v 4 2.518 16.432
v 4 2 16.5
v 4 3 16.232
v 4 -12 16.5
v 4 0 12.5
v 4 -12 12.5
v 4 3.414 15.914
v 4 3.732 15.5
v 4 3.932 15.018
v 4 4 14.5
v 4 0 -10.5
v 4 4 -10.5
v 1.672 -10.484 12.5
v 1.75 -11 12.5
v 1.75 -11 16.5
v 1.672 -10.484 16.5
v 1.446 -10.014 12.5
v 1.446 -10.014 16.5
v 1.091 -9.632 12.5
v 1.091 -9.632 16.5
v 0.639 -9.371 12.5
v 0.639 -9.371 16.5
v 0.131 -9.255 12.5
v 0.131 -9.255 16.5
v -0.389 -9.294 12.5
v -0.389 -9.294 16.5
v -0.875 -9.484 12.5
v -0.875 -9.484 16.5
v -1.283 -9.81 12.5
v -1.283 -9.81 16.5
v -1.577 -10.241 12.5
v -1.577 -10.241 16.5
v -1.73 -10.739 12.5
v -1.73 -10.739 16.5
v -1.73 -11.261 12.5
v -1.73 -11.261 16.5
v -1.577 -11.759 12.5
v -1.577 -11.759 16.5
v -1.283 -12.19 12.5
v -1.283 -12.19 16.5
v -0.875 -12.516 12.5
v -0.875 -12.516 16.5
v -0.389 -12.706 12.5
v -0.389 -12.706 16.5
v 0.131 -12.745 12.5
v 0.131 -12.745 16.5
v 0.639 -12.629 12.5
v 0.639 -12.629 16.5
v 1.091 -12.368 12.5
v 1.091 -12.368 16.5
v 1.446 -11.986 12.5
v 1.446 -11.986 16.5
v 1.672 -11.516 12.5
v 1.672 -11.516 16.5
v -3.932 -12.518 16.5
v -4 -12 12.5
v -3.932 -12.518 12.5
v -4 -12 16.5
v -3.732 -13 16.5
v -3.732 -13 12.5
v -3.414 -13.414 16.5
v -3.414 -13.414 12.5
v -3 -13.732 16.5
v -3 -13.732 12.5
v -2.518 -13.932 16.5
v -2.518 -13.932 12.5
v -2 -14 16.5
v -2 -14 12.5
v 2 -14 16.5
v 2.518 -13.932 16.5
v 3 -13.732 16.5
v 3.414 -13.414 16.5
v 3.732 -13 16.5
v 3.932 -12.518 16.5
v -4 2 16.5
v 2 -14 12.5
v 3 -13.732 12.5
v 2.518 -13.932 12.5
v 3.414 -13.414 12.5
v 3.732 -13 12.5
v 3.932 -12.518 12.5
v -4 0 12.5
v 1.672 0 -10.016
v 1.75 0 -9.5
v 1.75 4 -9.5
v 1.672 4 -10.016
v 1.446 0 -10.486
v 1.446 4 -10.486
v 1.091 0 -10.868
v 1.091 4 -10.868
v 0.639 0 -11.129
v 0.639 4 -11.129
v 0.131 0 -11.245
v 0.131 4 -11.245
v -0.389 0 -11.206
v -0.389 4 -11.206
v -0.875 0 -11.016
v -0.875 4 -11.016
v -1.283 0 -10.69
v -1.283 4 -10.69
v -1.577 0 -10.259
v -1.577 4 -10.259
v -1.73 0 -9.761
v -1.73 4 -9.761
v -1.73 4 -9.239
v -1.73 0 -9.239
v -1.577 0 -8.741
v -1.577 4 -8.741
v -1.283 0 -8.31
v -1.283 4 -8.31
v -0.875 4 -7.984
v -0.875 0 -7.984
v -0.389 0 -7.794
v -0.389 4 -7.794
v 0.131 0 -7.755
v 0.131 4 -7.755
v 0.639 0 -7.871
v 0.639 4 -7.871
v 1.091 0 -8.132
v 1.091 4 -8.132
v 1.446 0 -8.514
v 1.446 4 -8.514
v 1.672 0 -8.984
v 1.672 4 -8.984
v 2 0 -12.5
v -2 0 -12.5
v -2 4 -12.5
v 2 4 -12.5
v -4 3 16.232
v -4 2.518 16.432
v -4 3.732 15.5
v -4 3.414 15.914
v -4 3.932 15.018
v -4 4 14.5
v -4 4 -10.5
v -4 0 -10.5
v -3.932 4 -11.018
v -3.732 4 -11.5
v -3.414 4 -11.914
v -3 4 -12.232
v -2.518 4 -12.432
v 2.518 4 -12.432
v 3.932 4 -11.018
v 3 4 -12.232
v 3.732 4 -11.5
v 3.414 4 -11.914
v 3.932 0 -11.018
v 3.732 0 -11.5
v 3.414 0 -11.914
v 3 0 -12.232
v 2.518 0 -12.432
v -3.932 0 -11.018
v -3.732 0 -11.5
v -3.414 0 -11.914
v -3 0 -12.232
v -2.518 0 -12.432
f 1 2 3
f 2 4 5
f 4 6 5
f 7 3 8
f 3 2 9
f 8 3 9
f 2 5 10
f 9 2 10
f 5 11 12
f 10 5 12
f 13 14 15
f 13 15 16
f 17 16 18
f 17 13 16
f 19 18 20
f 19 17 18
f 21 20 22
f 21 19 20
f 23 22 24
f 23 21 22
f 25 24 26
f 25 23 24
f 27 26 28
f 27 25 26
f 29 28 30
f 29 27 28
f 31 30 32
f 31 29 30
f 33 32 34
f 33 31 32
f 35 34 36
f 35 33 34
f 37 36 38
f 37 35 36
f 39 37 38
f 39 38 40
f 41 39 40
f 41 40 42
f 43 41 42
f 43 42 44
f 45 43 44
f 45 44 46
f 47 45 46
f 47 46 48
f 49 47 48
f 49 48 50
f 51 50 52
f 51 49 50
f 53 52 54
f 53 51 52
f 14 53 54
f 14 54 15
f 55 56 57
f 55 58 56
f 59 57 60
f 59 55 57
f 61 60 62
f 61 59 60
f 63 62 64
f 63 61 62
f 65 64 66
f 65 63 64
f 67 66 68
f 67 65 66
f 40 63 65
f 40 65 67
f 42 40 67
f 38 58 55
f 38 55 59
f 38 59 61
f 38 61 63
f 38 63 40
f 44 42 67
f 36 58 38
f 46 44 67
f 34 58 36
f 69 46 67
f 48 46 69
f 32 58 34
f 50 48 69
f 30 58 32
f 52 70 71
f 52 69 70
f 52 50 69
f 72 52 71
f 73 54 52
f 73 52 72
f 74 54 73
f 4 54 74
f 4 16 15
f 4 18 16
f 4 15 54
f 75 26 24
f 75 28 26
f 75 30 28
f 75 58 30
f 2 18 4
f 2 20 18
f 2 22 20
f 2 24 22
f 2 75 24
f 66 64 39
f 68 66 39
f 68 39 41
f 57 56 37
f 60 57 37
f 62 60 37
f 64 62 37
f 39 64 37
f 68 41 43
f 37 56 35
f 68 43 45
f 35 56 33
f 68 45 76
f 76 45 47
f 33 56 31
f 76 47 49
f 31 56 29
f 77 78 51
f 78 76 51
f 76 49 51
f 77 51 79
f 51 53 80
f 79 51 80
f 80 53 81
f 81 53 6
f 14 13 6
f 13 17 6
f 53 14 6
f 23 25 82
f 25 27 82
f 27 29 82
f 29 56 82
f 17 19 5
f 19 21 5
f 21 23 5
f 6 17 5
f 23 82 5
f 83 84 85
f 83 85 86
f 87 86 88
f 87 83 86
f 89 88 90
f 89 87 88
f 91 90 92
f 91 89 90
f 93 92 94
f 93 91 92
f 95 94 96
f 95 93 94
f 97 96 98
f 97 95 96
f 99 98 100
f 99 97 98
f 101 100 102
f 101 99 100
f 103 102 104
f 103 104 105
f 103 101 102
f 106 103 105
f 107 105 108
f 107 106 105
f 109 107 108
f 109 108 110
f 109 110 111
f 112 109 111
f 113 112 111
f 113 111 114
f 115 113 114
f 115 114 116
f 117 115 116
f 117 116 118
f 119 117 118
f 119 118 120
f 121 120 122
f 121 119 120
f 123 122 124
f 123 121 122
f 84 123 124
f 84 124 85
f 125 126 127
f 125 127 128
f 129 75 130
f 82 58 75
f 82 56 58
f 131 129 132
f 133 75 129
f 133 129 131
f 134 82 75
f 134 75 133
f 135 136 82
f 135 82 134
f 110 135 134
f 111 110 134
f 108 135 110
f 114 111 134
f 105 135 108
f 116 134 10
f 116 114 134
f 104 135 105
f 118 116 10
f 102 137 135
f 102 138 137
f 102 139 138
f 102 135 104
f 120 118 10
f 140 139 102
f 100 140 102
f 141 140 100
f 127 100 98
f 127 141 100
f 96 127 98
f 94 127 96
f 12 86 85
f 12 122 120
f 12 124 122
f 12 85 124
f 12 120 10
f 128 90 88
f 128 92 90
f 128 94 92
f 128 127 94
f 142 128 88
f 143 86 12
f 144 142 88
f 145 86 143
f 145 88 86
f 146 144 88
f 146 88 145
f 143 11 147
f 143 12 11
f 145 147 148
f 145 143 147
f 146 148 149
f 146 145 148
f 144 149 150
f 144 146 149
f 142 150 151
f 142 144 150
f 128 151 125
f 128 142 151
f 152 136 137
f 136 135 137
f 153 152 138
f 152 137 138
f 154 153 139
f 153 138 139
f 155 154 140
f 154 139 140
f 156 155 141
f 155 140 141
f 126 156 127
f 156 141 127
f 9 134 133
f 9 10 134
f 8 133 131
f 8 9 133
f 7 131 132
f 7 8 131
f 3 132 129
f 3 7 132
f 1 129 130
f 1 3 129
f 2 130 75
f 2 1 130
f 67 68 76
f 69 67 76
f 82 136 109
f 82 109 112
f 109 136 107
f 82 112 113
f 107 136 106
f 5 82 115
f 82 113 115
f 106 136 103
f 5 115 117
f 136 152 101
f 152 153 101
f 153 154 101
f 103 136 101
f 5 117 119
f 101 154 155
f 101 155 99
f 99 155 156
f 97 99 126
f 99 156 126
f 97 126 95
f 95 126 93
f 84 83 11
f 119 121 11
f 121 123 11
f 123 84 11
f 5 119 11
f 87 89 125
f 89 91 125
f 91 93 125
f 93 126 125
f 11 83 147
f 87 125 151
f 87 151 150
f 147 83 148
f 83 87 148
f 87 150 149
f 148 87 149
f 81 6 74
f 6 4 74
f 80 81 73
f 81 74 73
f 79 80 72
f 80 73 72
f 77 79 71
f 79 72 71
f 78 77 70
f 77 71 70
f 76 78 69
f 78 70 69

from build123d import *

# Parameters (mm, degrees)
ESQUISSE1_W        = 8
ESQUISSE1_H        = 25
ESQUISSE1_R        = 1.75
BOSS_EXTRU_1_DEPTH = 4
ESQUISSE2_W        = 8
ESQUISSE2_H        = 18
ESQUISSE2_R        = 1.75
BOSS_EXTRU_2_DEPTH = 4
CONG_1_R           = 2


with BuildPart() as part:
    # Esquisse1 → Boss.-Extru.1 (new body)
    with BuildSketch(Plane(origin=(0, 0, 0), x_dir=(1, 0, 0), z_dir=(0, 1, 0))):
        Rectangle(ESQUISSE1_W, ESQUISSE1_H)
        with Locations((0, 9.5)):
            Circle(ESQUISSE1_R, mode=Mode.SUBTRACT)
    extrude(amount=BOSS_EXTRU_1_DEPTH)

    # Esquisse2 → Boss.-Extru.2 (add)
    with BuildSketch(Plane.XY.offset(12.5)):
        with Locations((0, -5)):
            Rectangle(ESQUISSE2_W, ESQUISSE2_H)
        with Locations((0, -11)):
            Circle(ESQUISSE2_R, mode=Mode.SUBTRACT)
    extrude(amount=BOSS_EXTRU_2_DEPTH)

    # Congé1
    cong_1_edges = [part.edges().sort_by_distance(p)[0] for p in [
        (0, 4, 16.5),
        (-4, -14, 14.5),
        (4, -14, 14.5),
        (-4, 2, -12.5),
        (4, 2, -12.5),
    ]]
    fillet(cong_1_edges, radius=CONG_1_R)


solid = part.part
